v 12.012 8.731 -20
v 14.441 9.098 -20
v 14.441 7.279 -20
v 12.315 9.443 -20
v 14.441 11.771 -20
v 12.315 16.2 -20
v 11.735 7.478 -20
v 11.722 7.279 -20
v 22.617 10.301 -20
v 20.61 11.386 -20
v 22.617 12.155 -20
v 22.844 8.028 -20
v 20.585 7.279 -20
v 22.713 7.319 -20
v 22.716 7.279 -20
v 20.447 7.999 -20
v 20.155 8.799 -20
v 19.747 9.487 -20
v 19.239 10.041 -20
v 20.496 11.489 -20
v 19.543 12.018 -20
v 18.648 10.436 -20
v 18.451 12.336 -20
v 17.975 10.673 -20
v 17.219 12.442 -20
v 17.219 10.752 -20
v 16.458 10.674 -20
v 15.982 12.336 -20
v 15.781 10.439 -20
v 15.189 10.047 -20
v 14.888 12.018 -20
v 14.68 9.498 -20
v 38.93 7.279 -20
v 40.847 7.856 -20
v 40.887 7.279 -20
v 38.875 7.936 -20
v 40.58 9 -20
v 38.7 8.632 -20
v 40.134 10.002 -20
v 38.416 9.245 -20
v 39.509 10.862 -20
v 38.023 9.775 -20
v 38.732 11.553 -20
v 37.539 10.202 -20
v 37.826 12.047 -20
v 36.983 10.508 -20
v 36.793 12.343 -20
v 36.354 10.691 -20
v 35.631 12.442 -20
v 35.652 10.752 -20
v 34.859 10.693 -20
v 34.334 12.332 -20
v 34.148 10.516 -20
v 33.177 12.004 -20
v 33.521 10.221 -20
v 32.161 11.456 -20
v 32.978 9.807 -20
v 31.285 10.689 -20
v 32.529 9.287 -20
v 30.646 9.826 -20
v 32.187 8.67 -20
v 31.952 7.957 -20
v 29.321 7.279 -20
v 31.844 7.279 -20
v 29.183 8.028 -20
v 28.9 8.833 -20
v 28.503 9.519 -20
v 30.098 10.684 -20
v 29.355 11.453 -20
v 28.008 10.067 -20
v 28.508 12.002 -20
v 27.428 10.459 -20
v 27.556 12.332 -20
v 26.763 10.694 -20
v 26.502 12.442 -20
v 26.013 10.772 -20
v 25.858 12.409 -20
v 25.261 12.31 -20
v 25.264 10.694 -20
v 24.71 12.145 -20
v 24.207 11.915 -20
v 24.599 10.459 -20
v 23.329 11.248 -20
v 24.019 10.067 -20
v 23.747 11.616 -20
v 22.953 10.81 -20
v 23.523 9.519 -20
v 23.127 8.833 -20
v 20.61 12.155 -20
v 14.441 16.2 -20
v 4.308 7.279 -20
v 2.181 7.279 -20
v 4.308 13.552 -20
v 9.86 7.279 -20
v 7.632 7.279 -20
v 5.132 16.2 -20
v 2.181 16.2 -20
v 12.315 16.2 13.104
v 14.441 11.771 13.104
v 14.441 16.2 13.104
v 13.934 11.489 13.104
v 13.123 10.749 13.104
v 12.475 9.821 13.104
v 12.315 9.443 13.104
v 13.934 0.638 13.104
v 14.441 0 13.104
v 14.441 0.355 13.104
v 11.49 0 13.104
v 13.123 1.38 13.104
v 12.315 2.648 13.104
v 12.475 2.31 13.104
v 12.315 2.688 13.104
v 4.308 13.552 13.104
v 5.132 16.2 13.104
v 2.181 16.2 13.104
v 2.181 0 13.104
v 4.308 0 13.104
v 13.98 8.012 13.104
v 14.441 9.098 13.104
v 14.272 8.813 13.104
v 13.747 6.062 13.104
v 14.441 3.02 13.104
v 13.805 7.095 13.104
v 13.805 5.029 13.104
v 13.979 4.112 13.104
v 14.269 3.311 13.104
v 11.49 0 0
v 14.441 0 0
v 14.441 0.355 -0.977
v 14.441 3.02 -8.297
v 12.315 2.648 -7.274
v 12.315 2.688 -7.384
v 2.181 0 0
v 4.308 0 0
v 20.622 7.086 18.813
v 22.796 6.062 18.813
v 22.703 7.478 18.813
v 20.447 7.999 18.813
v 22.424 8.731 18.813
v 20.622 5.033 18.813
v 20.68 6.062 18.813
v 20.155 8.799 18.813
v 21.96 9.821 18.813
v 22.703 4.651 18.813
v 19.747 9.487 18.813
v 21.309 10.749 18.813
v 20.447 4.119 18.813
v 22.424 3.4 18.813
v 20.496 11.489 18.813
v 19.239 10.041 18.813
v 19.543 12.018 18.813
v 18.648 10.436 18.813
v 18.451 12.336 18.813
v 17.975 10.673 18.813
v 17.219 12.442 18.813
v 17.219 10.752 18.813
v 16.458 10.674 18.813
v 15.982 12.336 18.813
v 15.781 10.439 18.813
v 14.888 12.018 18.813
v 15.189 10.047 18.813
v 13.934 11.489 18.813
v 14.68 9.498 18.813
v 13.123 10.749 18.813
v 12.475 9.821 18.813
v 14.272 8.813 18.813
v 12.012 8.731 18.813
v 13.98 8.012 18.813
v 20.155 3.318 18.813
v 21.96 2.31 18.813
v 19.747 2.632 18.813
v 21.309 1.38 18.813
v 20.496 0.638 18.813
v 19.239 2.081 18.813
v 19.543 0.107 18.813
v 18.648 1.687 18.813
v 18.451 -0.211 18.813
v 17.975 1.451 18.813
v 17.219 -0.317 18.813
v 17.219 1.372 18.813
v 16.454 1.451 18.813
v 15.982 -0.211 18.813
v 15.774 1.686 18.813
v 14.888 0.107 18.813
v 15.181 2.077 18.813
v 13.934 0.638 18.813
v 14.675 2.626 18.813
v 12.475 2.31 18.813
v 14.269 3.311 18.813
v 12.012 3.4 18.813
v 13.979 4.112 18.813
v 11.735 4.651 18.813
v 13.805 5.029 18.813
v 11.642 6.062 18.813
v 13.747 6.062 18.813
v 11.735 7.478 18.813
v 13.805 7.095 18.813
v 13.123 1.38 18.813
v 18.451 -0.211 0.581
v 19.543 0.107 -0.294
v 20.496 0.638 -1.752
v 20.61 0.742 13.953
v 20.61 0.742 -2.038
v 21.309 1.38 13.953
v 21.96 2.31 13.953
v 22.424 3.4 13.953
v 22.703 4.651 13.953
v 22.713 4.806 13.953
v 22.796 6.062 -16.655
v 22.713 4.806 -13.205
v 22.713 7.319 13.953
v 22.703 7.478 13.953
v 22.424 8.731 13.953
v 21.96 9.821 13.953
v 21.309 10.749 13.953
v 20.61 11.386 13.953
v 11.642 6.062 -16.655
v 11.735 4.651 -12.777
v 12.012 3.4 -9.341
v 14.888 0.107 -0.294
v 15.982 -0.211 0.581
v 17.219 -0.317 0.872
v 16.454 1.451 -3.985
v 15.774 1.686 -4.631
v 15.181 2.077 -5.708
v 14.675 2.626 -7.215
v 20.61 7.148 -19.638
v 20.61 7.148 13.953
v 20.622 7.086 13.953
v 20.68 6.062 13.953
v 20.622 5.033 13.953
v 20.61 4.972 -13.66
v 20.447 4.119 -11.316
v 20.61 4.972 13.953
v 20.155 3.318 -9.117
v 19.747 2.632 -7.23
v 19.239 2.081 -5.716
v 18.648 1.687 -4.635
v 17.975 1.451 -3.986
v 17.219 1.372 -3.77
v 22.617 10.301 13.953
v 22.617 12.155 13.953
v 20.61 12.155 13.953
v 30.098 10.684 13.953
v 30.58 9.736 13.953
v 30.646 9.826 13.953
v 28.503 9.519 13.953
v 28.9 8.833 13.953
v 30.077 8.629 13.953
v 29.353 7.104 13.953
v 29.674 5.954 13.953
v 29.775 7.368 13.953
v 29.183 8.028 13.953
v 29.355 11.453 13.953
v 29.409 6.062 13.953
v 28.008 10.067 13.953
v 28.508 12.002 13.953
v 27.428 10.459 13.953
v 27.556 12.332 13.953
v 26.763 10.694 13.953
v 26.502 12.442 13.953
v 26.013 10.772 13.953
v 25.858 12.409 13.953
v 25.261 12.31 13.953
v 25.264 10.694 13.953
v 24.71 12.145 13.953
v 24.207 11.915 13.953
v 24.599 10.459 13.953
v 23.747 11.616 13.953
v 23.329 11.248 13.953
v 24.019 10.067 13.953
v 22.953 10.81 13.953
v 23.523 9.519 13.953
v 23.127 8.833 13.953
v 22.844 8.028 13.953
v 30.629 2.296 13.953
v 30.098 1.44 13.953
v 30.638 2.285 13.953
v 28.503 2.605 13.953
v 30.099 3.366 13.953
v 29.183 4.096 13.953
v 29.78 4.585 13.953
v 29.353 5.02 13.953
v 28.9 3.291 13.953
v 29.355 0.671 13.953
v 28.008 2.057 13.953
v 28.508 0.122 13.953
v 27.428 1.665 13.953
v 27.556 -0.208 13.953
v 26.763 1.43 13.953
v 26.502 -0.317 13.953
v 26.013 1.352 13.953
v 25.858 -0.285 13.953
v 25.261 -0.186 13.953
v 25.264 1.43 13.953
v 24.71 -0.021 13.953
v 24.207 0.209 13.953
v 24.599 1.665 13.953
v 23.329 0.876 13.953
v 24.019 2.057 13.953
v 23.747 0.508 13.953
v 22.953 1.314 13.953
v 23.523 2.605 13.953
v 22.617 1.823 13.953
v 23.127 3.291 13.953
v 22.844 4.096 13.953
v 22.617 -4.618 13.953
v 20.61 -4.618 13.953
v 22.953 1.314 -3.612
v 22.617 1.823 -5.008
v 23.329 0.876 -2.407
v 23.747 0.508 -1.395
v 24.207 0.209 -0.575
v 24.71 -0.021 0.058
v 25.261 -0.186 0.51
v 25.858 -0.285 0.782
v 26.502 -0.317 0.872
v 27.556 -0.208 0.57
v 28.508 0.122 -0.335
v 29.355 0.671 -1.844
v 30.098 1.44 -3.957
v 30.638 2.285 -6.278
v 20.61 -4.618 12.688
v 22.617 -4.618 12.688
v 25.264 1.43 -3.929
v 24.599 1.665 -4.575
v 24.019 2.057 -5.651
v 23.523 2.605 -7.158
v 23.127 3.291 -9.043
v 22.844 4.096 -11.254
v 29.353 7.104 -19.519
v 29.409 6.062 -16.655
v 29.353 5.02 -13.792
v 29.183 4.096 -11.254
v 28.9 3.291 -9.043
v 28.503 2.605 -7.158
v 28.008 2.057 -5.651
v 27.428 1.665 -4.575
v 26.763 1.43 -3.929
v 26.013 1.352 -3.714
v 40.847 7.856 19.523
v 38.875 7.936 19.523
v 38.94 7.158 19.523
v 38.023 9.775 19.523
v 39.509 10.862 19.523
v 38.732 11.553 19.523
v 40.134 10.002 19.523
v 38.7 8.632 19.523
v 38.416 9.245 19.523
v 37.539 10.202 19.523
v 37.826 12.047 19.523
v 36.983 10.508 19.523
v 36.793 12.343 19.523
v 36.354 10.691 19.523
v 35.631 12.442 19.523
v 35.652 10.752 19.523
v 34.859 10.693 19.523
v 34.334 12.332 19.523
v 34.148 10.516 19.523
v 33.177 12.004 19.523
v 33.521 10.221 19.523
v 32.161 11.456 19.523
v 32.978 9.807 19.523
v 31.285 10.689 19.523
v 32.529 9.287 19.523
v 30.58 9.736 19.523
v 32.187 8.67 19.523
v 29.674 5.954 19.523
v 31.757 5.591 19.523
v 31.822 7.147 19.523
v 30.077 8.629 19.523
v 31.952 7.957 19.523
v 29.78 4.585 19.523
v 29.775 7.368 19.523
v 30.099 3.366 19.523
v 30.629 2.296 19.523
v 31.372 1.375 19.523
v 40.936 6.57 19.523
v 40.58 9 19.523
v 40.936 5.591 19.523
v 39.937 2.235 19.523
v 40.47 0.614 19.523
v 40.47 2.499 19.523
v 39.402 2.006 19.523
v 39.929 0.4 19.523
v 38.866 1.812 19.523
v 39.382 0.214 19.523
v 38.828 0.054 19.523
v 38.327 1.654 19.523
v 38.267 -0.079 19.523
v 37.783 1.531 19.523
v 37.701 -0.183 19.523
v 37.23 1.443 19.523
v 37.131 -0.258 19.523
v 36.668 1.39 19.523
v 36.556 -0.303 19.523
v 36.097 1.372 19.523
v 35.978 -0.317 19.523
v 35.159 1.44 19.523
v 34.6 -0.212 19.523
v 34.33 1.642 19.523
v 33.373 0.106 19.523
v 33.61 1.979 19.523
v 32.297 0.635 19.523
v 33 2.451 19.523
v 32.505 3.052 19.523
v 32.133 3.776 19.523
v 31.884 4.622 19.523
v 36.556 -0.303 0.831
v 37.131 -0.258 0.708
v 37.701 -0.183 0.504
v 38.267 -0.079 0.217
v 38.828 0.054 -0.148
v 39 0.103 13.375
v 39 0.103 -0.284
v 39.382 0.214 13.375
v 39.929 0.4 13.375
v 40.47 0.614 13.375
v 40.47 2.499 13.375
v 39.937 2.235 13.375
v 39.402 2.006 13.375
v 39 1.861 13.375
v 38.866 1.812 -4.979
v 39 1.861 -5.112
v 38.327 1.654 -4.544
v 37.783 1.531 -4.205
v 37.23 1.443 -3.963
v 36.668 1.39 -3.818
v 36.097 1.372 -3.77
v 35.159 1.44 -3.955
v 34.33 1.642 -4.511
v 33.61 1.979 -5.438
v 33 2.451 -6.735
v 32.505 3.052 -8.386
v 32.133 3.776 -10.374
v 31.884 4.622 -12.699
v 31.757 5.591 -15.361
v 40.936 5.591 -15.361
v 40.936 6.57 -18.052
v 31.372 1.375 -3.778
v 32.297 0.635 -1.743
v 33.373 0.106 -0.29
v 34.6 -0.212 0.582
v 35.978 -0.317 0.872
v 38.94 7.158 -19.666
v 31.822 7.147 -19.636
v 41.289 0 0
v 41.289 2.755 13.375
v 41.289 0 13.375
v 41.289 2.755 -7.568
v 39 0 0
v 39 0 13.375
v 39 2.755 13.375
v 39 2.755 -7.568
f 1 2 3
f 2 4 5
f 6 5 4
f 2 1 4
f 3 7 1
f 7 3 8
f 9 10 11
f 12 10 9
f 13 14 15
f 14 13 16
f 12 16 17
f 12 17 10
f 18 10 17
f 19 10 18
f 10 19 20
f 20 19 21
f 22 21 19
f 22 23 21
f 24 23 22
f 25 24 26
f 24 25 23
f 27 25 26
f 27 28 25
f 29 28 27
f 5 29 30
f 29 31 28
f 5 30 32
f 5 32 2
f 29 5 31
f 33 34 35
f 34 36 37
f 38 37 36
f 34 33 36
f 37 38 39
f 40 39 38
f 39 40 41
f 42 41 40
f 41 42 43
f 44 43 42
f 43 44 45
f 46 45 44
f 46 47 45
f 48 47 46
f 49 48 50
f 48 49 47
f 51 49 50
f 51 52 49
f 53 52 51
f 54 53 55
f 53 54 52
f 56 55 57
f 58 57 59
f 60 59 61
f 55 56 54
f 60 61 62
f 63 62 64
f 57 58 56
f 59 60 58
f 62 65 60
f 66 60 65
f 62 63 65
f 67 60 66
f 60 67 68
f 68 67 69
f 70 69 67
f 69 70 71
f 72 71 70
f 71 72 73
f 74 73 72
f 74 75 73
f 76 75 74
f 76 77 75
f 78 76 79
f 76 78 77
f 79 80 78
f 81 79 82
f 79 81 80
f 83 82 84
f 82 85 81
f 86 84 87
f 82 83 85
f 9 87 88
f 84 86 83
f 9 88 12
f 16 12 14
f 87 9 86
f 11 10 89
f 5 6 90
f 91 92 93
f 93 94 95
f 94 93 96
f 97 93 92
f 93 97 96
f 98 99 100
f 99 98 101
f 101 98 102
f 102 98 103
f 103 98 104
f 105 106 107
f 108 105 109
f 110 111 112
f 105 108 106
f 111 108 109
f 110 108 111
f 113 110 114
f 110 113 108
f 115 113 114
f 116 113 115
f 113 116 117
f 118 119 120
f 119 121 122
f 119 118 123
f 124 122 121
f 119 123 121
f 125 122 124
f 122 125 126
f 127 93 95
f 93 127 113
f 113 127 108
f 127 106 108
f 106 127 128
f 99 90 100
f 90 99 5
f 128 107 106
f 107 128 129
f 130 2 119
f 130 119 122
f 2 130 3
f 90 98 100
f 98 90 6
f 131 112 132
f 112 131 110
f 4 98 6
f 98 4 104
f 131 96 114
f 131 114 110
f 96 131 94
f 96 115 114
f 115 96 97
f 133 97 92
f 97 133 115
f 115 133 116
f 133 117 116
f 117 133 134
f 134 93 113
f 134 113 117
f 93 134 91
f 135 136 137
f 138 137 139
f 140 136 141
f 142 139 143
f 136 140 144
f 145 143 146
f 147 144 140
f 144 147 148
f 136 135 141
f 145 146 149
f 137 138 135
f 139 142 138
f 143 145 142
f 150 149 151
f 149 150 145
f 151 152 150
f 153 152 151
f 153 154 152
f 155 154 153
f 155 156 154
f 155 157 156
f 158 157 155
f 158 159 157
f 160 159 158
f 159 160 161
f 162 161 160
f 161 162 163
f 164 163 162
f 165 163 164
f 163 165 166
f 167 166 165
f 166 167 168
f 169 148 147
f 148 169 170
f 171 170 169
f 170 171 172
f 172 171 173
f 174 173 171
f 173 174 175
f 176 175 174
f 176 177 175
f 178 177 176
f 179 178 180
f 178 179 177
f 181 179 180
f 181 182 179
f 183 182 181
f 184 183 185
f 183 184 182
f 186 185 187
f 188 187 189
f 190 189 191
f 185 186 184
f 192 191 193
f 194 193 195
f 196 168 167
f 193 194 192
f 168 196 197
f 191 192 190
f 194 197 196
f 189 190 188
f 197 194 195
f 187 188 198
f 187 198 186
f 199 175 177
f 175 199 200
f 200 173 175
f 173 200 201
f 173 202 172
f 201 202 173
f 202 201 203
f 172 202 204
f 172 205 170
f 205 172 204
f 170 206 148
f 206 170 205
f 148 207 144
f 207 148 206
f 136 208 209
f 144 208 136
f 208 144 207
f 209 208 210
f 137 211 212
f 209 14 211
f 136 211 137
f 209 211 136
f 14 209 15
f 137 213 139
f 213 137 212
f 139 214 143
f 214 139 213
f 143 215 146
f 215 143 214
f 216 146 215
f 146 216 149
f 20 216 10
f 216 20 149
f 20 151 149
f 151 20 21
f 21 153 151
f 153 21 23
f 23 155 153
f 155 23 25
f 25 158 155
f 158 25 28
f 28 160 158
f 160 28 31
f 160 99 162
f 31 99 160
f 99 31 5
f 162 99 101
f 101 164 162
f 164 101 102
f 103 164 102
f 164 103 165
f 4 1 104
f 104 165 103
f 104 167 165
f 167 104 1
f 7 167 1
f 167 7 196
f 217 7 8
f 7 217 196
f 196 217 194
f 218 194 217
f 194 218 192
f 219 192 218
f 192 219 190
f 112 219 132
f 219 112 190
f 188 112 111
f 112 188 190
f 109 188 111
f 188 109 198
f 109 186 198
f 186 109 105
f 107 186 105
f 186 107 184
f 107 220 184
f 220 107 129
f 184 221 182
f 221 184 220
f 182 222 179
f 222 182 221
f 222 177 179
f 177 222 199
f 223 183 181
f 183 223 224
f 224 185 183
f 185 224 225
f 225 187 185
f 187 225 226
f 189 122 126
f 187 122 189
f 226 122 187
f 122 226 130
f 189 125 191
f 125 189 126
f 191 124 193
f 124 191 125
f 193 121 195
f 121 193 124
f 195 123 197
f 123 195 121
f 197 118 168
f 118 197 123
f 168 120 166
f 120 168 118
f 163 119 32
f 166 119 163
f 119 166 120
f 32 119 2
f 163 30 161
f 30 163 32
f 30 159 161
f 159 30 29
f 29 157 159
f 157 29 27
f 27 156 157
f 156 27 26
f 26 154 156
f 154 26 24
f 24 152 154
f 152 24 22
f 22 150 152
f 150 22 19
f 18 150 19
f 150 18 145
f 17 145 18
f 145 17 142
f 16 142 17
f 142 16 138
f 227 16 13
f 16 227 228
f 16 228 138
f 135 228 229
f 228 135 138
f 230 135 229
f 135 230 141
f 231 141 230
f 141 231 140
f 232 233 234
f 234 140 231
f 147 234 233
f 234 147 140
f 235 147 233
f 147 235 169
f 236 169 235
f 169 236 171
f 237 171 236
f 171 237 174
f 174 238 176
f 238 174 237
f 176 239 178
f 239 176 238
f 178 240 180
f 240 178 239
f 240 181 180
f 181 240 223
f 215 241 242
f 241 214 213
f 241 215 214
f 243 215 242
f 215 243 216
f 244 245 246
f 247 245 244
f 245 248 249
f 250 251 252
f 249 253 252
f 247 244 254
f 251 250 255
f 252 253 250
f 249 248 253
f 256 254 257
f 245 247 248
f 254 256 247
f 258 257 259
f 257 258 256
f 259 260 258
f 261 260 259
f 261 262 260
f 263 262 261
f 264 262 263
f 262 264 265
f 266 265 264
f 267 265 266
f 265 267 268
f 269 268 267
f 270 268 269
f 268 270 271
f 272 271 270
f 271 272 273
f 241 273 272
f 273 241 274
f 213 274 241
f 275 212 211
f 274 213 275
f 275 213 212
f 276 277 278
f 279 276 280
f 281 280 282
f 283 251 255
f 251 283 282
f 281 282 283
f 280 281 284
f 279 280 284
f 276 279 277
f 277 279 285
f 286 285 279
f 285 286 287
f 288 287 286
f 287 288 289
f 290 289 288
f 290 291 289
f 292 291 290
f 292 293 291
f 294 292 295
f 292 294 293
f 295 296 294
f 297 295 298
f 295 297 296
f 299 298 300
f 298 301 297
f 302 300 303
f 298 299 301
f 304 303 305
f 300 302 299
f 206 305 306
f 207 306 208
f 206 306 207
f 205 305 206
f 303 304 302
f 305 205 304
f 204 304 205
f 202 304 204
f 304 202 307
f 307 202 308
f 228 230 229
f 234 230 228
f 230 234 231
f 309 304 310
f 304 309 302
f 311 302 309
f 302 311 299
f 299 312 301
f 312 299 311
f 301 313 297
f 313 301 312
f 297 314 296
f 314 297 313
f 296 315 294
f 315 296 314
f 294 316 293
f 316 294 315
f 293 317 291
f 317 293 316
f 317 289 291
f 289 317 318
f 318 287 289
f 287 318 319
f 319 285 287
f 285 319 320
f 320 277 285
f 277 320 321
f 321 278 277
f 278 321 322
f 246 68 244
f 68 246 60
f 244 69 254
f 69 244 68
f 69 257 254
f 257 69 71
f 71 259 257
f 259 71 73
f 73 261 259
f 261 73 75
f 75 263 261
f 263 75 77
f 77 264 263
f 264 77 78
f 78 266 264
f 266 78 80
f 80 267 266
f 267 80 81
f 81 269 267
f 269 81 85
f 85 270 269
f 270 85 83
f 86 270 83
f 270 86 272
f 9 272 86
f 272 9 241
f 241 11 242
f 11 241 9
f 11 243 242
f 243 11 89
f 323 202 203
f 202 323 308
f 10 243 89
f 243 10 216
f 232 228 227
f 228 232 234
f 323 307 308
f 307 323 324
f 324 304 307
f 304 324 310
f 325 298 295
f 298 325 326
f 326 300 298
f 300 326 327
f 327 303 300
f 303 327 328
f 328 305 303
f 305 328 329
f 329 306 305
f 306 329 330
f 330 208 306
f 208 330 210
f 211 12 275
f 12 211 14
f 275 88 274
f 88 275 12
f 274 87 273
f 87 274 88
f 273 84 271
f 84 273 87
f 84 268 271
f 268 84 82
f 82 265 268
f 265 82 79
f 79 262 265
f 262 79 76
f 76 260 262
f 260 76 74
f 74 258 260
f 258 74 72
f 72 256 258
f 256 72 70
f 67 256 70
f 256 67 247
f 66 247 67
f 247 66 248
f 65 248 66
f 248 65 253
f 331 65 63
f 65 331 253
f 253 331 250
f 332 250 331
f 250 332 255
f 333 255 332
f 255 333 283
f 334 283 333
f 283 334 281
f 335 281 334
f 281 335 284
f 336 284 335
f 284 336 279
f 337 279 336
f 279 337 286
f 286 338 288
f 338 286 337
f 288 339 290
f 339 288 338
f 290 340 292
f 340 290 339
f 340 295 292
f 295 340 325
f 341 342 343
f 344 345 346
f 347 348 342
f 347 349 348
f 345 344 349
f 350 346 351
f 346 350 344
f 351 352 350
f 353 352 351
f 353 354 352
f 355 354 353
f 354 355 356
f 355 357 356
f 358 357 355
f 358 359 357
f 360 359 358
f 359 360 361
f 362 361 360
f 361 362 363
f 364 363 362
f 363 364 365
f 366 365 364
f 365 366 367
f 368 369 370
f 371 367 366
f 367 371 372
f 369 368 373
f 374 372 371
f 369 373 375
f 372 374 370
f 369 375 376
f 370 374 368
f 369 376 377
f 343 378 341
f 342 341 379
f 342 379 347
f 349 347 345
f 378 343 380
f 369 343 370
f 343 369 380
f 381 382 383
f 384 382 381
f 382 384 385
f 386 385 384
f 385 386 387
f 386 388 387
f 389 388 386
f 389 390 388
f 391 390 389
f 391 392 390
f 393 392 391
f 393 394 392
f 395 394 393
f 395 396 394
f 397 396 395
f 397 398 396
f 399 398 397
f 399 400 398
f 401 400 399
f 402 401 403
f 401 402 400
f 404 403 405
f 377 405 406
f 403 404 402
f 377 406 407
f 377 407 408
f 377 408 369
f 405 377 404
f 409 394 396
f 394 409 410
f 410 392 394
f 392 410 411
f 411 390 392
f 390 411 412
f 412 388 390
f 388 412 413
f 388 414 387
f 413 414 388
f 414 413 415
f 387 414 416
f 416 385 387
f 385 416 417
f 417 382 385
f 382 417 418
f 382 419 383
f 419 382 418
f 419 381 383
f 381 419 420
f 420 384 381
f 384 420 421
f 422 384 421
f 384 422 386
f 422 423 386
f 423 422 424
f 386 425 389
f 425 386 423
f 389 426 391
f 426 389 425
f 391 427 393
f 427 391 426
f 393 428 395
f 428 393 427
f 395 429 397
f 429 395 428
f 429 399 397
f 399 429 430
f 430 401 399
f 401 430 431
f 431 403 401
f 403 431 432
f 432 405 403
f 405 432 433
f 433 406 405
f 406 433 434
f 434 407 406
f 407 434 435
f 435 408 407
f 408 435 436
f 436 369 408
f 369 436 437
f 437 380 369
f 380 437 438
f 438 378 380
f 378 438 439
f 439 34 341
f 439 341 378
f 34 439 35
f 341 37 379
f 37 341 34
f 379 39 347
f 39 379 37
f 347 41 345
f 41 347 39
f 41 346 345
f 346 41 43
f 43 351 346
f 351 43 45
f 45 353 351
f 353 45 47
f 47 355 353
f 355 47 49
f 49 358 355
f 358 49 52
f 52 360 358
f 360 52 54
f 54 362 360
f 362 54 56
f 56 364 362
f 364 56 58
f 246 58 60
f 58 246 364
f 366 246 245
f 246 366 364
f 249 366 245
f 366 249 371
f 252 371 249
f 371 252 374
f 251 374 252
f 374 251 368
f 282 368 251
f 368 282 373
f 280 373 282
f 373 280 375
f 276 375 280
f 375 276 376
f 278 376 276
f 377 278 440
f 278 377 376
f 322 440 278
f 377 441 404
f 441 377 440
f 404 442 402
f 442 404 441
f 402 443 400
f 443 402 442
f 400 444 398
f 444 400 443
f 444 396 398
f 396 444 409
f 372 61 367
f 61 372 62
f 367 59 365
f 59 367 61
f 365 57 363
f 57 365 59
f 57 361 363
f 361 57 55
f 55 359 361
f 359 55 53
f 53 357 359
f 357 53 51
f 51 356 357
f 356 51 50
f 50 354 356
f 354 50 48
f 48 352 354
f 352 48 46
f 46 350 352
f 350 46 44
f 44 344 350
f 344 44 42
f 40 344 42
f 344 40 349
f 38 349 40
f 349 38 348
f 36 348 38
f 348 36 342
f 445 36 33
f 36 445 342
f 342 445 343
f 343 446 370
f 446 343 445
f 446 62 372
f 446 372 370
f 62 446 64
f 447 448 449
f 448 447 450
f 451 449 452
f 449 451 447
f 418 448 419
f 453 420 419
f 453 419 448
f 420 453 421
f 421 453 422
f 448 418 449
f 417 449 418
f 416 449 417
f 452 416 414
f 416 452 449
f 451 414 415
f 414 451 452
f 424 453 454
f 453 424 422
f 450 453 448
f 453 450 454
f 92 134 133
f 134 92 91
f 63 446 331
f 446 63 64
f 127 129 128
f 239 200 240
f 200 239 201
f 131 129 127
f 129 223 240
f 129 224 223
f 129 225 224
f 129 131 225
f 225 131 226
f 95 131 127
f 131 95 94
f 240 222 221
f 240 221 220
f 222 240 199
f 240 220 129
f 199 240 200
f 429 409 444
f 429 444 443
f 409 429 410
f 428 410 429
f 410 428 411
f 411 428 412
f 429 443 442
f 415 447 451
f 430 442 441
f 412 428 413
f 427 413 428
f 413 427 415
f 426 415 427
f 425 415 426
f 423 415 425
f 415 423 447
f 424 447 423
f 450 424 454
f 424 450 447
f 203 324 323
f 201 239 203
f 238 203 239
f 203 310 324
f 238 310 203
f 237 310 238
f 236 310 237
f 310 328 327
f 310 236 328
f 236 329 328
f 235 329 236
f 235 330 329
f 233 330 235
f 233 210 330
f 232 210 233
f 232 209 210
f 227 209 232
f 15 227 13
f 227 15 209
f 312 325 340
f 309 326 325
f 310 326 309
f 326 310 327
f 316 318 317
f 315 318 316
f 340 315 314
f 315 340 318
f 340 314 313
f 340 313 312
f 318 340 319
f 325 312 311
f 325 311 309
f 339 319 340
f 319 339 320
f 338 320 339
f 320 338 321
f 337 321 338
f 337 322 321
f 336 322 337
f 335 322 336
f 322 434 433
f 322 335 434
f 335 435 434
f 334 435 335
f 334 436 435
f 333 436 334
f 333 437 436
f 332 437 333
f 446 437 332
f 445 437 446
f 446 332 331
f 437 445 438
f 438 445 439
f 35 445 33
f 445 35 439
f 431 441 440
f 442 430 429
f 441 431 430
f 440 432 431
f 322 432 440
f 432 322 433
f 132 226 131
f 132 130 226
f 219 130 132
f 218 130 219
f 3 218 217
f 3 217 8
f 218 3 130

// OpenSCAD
//Set the text to render
textstring="Nope.";

//Font name, e.g. "Libration Sans", "Aldo", depends on what is available on the platform. In the customizer,choose from about 700 Google Fonts. For an overview please refer: http://www.google.com/fonts
fontname="Spicy Rice"; //[ABeeZee,Abel,Abril Fatface,Aclonica,Acme,Actor,Adamina,Advent Pro,Aguafina Script,Akronim,Aladin,Aldrich,Alef,Alegreya,Alegreya Sans,Alegreya Sans SC,Alegreya SC,Alex Brush,Alfa Slab One,Alice,Alike,Alike Angular,Allan,Allerta,Allerta Stencil,Allura,Almendra,Almendra Display,Almendra SC,Amarante,Amaranth,Amatic SC,Amethysta,Amiri,Anaheim,Andada,Andika,Angkor,Annie Use Your Telescope,Anonymous Pro,Antic,Antic Didone,Antic Slab,Anton,Arapey,Arbutus,Arbutus Slab,Architects Daughter,Archivo Black,Archivo Narrow,Arimo,Arizonia,Armata,Artifika,Arvo,Asap,Asset,Astloch,Asul,Atomic Age,Aubrey,Audiowide,Autour One,Average,Average Sans,Averia Gruesa Libre,Averia Libre,Averia Sans Libre,Averia Serif Libre,Bad Script,Balthazar,Bangers,Basic,Battambang,Baumans,Bayon,Belgrano,Belleza,BenchNine,Bentham,Berkshire Swash,Bevan,Bigelow Rules,Bigshot One,Bilbo,Bilbo Swash Caps,Bitter,Black Ops One,Bokor,Bonbon,Boogaloo,Bowlby One,Bowlby One SC,Brawler,Bree Serif,Bubblegum Sans,Bubbler One,Buda,Buenard,Butcherman,Butterfly Kids,Cabin,Cabin Condensed,Cabin Sketch,Caesar Dressing,Cagliostro,Calligraffitti,Cambay,Cambo,Candal,Cantarell,Cantata One,Cantora One,Capriola,Cardo,Carme,Carrois Gothic,Carrois Gothic SC,Carter One,Caudex,Cedarville Cursive,Ceviche One,Changa One,Chango,Chau Philomene One,Chela One,Chelsea Market,Chenla,Cherry Cream Soda,Cherry Swash,Chewy,Chicle,Chivo,Cinzel,Cinzel Decorative,Clicker Script,Coda,Coda Caption,Codystar,Combo,Comfortaa,Coming Soon,Concert One,Condiment,Content,Contrail One,Convergence,Cookie,Copse,Corben,Courgette,Cousine,Coustard,Covered By Your Grace,Crafty Girls,Creepster,Crete Round,Crimson Text,Croissant One,Crushed,Cuprum,Cutive,Cutive Mono,Damion,Dancing Script,Dangrek,Dawning of a New Day,Days One,Dekko,Delius,Delius Swash Caps,Delius Unicase,Della Respira,Denk One,Devonshire,Dhurjati,Didact Gothic,Diplomata,Diplomata SC,Domine,Donegal One,Doppio One,Dorsa,Dosis,Dr Sugiyama,Droid Sans,Droid Sans Mono,Droid Serif,Duru Sans,Dynalight,Eagle Lake,Eater,EB Garamond,Economica,Ek Mukta,Electrolize,Elsie,Elsie Swash Caps,Emblema One,Emilys Candy,Engagement,Englebert,Enriqueta,Erica One,Esteban,Euphoria Script,Ewert,Exo,Exo 2,Expletus Sans,Fanwood Text,Fascinate,Fascinate Inline,Faster One,Fasthand,Fauna One,Federant,Federo,Felipa,Fenix,Finger Paint,Fira Mono,Fira Sans,Fjalla One,Fjord One,Flamenco,Flavors,Fondamento,Fontdiner Swanky,Forum,Francois One,Freckle Face,Fredericka the Great,Fredoka One,Freehand,Fresca,Frijole,Fruktur,Fugaz One,Gabriela,Gafata,Galdeano,Galindo,Gentium Basic,Gentium Book Basic,Geo,Geostar,Geostar Fill,Germania One,GFS Didot,GFS Neohellenic,Gidugu,Gilda Display,Give You Glory,Glass Antiqua,Glegoo,Gloria Hallelujah,Goblin One,Gochi Hand,Gorditas,Goudy Bookletter 1911,Graduate,Grand Hotel,Gravitas One,Great Vibes,Griffy,Gruppo,Gudea,Gurajada,Habibi,Halant,Hammersmith One,Hanalei,Hanalei Fill,Handlee,Hanuman,Happy Monkey,Headland One,Henny Penny,Herr Von Muellerhoff,Hind,Holtwood One SC,Homemade Apple,Homenaje,Iceberg,Iceland,IM Fell Double Pica,IM Fell Double Pica SC,IM Fell DW Pica,IM Fell DW Pica SC,IM Fell English,IM Fell English SC,IM Fell French Canon,IM Fell French Canon SC,IM Fell Great Primer,IM Fell Great Primer SC,Imprima,Inconsolata,Inder,Indie Flower,Inika,Irish Grover,Istok Web,Italiana,Italianno,Jacques Francois,Jacques Francois Shadow,Jim Nightshade,Jockey One,Jolly Lodger,Josefin Sans,Josefin Slab,Joti One,Judson,Julee,Julius Sans One,Junge,Jura,Just Another Hand,Just Me Again Down Here,Kalam,Kameron,Kantumruy,Karla,Karma,Kaushan Script,Kavoon,Kdam Thmor,Keania One,Kelly Slab,Kenia,Khand,Khmer,Khula,Kite One,Knewave,Kotta One,Koulen,Kranky,Kreon,Kristi,Krona One,La Belle Aurore,Laila,Lakki Reddy,Lancelot,Lateef,Lato,League Script,Leckerli One,Ledger,Lekton,Lemon,Liberation Sans,Libre Baskerville,Life Savers,Lilita One,Lily Script One,Limelight,Linden Hill,Lobster,Lobster Two,Londrina Outline,Londrina Shadow,Londrina Sketch,Londrina Solid,Lora,Love Ya Like A Sister,Loved by the King,Lovers Quarrel,Luckiest Guy,Lusitana,Lustria,Macondo,Macondo Swash Caps,Magra,Maiden Orange,Mako,Mallanna,Mandali,Marcellus,Marcellus SC,Marck Script,Margarine,Marko One,Marmelad,Martel Sans,Marvel,Mate,Mate SC,Maven Pro,McLaren,Meddon,MedievalSharp,Medula One,Megrim,Meie Script,Merienda,Merienda One,Merriweather,Merriweather Sans,Metal,Metal Mania,Metamorphous,Metrophobic,Michroma,Milonga,Miltonian,Miltonian Tattoo,Miniver,Miss Fajardose,Modak,Modern Antiqua,Molengo,Molle,Monda,Monofett,Monoton,Monsieur La Doulaise,Montaga,Montez,Montserrat,Montserrat Alternates,Montserrat Subrayada,Moul,Moulpali,Mountains of Christmas,Mouse Memoirs,Mr Bedfort,Mr Dafoe,Mr De Haviland,Mrs Saint Delafield,Mrs Sheppards,Muli,Mystery Quest,Neucha,Neuton,New Rocker,News Cycle,Niconne,Nixie One,Nobile,Nokora,Norican,Nosifer,Nothing You Could Do,Noticia Text,Noto Sans,Noto Serif,Nova Cut,Nova Flat,Nova Mono,Nova Oval,Nova Round,Nova Script,Nova Slim,Nova Square,NTR,Numans,Nunito,Odor Mean Chey,Offside,Old Standard TT,Oldenburg,Oleo Script,Oleo Script Swash Caps,Open Sans,Open Sans Condensed,Oranienbaum,Orbitron,Oregano,Orienta,Original Surfer,Oswald,Over the Rainbow,Overlock,Overlock SC,Ovo,Oxygen,Oxygen Mono,Pacifico,Paprika,Parisienne,Passero One,Passion One,Pathway Gothic One,Patrick Hand,Patrick Hand SC,Patua One,Paytone One,Peddana,Peralta,Permanent Marker,Petit Formal Script,Petrona,Philosopher,Piedra,Pinyon Script,Pirata One,Plaster,Play,Playball,Playfair Display,Playfair Display SC,Podkova,Poiret One,Poller One,Poly,Pompiere,Pontano Sans,Port Lligat Sans,Port Lligat Slab,Prata,Preahvihear,Press Start 2P,Princess Sofia,Prociono,Prosto One,PT Mono,PT Sans,PT Sans Caption,PT Sans Narrow,PT Serif,PT Serif Caption,Puritan,Purple Purse,Quando,Quantico,Quattrocento,Quattrocento Sans,Questrial,Quicksand,Quintessential,Qwigley,Racing Sans One,Radley,Rajdhani,Raleway,Raleway Dots,Ramabhadra,Ramaraja,Rambla,Rammetto One,Ranchers,Rancho,Ranga,Rationale,Ravi Prakash,Redressed,Reenie Beanie,Revalia,Ribeye,Ribeye Marrow,Righteous,Risque,Roboto,Roboto Condensed,Roboto Slab,Rochester,Rock Salt,Rokkitt,Romanesco,Ropa Sans,Rosario,Rosarivo,Rouge Script,Rozha One,Rubik Mono One,Rubik One,Ruda,Rufina,Ruge Boogie,Ruluko,Rum Raisin,Ruslan Display,Russo One,Ruthie,Rye,Sacramento,Sail,Salsa,Sanchez,Sancreek,Sansita One,Sarina,Sarpanch,Satisfy,Scada,Scheherazade,Schoolbell,Seaweed Script,Sevillana,Seymour One,Shadows Into Light,Shadows Into Light Two,Shanti,Share,Share Tech,Share Tech Mono,Shojumaru,Short Stack,Siemreap,Sigmar One,Signika,Signika Negative,Simonetta,Sintony,Sirin Stencil,Six Caps,Skranji,Slabo 13px,Slabo 27px,Slackey,Smokum,Smythe,Sniglet,Snippet,Snowburst One,Sofadi One,Sofia,Sonsie One,Sorts Mill Goudy,Source Code Pro,Source Sans Pro,Source Serif Pro,Special Elite,Spicy Rice,Spinnaker,Spirax,Squada One,Sree Krushnadevaraya,Stalemate,Stalinist One,Stardos Stencil,Stint Ultra Condensed,Stint Ultra Expanded,Stoke,Strait,Sue Ellen Francisco,Sunshiney,Supermercado One,Suranna,Suravaram,Suwannaphum,Swanky and Moo Moo,Syncopate,Tangerine,Taprom,Tauri,Teko,Telex,Tenali Ramakrishna,Tenor Sans,Text Me One,The Girl Next Door,Tienne,Timmana,Tinos,Titan One,Titillium Web,Trade Winds,Trocchi,Trochut,Trykker,Tulpen One,Ubuntu,Ubuntu Condensed,Ubuntu Mono,Ultra,Uncial Antiqua,Underdog,Unica One,UnifrakturCook,UnifrakturMaguntia,Unkempt,Unlock,Unna,Vampiro One,Varela,Varela Round,Vast Shadow,Vesper Libre,Vibur,Vidaloka,Viga,Voces,Volkhov,Vollkorn,Voltaire,VT323,Waiting for the Sunrise,Wallpoet,Walter Turncoat,Warnes,Wellfleet,Wendy One,Wire One,Yanone Kaffeesatz,Yellowtail,Yeseva One,Yesteryear,Zeyada]

//Characters overlap for printing
Overlap=.12;

//Do a random height design or rotate each letter. If you rotate the letters, you can reduce the overall textheight to e.g. 35 and it will become more stable
Letters="Random_height"; //[Random_height,Rotated]

//Rotation angle of letters (if Letters is set to rotated above). You can enter both positive and negative numbers. Ideal are e.g. +10 or -10 degrees
LetterRotation=10;

//Use a rounded base to connect all letters or use a connecting bar? Or  just a bar
Base="None"; //[Bar,Rounded,None]

//Set font size in mm
textsize=16; 

//Maximum thickness (z extrusion height) of the letters in mm (includes random part)
textheight=40;

//Of total thickness: Non-random (=minimum) height of letters, including cutoff (z extrusion height) in mm. Note: Total thickness "textheight" < height of letters "height_letter" < connecting bar height "baseheight"
height_letter=10;

//Of total thickness: Connecting bar height (z extrusion height) in mm. 
baseheight=20;


//Connecting bar thickness in percent of the font size
basethickness_percent=0.2;
basethickness=textsize*basethickness_percent;

//Only for a rounded base: Base increase size to make letters meet, in percent of the textsize
base_radius_add_percent=.22;
base_radius_add=textsize*base_radius_add_percent;

//Shift the font up/down to connect i and j dots? Select "no" if you have no i or j in your text.
do_shift_font="automatic"; //[automatic,yes,no]

//Amount to shift the font up/down to connect i and j dots for printing. 
font_catch_diacritical_sign=2.3; 

//angle to rotate the text upwards
rotate_angle=20;

/* [Hidden] */
//-------------------------------------------------------------------------------

iorj = [ for (i = [0 : len(textstring) - 1]) if (textstring[i]=="i" || textstring[i]=="j") 1 ];


CharacterDistance=.7;//.7 no touch
OverlapLength = Overlap*CharacterDistance;

bigCharacterDistance=CharacterDistance*1.4; // m  M
midbigCharacterDistance=CharacterDistance*1.22; // w W X
CapitalCharacterDistance=CharacterDistance*1.05; // A-Z
midCharacterDistance=CharacterDistance*.85; // c e 
smallCharacterDistance=CharacterDistance*.7; //f t
smallestCharacterDistance=CharacterDistance*.46; // i j l 
    
function add(v, i = 0, r = 0, max) = i < max ? add(v, i + 1, r + v[i], max) : r; 

/*
Fancy Nameplate
Version E, January 2019
Written by MC Geisler (mcgenki at gmail dot com)

This is a proper configurable nameplate, consisting of separate extruded letters. 

Have fun!

License: Attribution 4.0 International (CC BY 4.0)

You are free to:
    Share - copy and redistribute the material in any medium or format
    Adapt - remix, transform, and build upon the material
    for any purpose, even commercially.
*/


module writetextgeneric(textstring, sizeit, type)
{
    shiftit = [ for (i = [0 : len(textstring) - 1]) (textstring[i]=="t" ? -2*smallCharacterDistance:0 )   ]; //2.9?

    skip = [ for (i = [0 : len(textstring) - 1]) 
        (textstring[i]=="f" || textstring[i]=="t" ? smallCharacterDistance : 
        textstring[i]=="i" || textstring[i]=="I" ||textstring[i]=="j" || textstring[i]=="l" ? smallestCharacterDistance:
        textstring[i]=="c" || textstring[i]=="e" || textstring[i]=="k" || textstring[i]=="v" || textstring[i]=="o" || textstring[i]=="s" || textstring[i]=="r"|| textstring[i]=="L" ? midCharacterDistance:
        textstring[i]=="m" || textstring[i]=="M" ? bigCharacterDistance:
        textstring[i]=="w" || textstring[i]=="W" || textstring[i]=="X"? midbigCharacterDistance:
        (textstring[i]>="A" && textstring[i]<="Z" && textstring[i]!="F"&& textstring[i]!="E")? CapitalCharacterDistance:
        CharacterDistance ) 
        - OverlapLength ];

    skiptotal = [ for (ii = [len(textstring)-1 : -1 : 0]) add(skip,max=len(skip)-ii)  ];


        
        translate([0,0,-baseheight])
        for (i = [0 : len(textstring) - 1]) 
        {         
            //echo ("coutn",i-1);
            translate([textsize*(i>0?skiptotal[i-1]:0)+shiftit[i],0,0])
            {
                if(type=="3d" && Letters=="Random_height")
                {
                    linear_extrude(height= rands((baseheight+height_letter)*10,textheight*10,1)[0]/10,convexity = 10)
                    {
                        text( textstring[i] ,size=sizeit,font=fontname,halign="left",valign="baseline");
                        //translate([-textsize*skip[i]/2*0 - shiftit[i]*0,-sizeit/2,0]) square([textsize*skip[i]-.5,sizeit/2], center=false);
                    }
                }
                if(type=="2d")
                {
                    text( textstring[i] ,size=sizeit,font=fontname,halign="left",valign="baseline");
                }
                
                if(type=="3d" && Letters=="Rotated") //Rotated
                {
                    rotate([0,LetterRotation,0])
                        translate([0,0,(LetterRotation<0?sin(LetterRotation)*bigCharacterDistance*textsize:0)])
                            linear_extrude(height= textheight,convexity = 10)
                            {
                                text( textstring[i] ,size=sizeit,font=fontname,halign="left",valign="baseline");
                            }
                
                }
            }


    }
}

module writetextblock(textstring, sizeit)
{
    writetextgeneric(textstring, sizeit, "3d");
}

module writetext(textstring, sizeit)
{
    writetextgeneric(textstring, sizeit, "2d");
}

module Bar(textstr, textsize)
{
    dummy_cutoutlen=len(textstr)*textsize;

    //base line to connect

    linear_extrude(height=baseheight, twist=0, slices=1, $fn=32) 
        hull()
            intersection()
            {
                writetext(textstr, textsize);
                
                //translate([0,-textsize/2+basethickness/2+base_offset,0])
                translate([0,basethickness/2,0])
                   square([dummy_cutoutlen,basethickness],center=false);
            }
}
            
module RiseText(textstr, textsize) 
{

    intersection()
    {
        union()
        {
            writetextblock(textstr, textsize);

            //create base
            if(Base=="Bar")
            {
               translate([0,0,-baseheight])
                    Bar(textstr, textsize);
            }
            
            if (Base=="Rounded")
            {
                 
                    translate([0,0,-baseheight])
                    {
                        linear_extrude(height=baseheight, twist=0, slices=1, $fn=32) 
                            offset(r = base_radius_add) 
                            {
                                writetext(textstr, textsize);
                            }
                        Bar(textstr, textsize);
                    }
            }
            
            
            if ( (do_shift_font=="automatic" && iorj[0]==1) || do_shift_font=="yes" )  
            {
                //connect i and j dots
               
               delta=textsize/30*font_catch_diacritical_sign;
               
               translate([0,0,-baseheight])
               intersection()
               {
                   //connect the dots but maybe too much in other locations
                   linear_extrude(height=1.5,convexity = 10)
                        offset(delta=-delta)   
                            offset(delta=delta)
                                writetext(textstr, textsize);
               
                   //connect only vertical parts by shifting
                   linear_extrude(height=1.5,convexity = 10)
                       for ( i = [-1 : 1] )
                           translate([0,i*delta,0])
                                writetext(textstr, textsize);

               }
           }
       
       
        }
         
        boxwidth=len(textstr)*textsize*CharacterDistance;
        boxlength=textsize*1.3*2;
        boxheight=(textheight)*2.1;
        
        rotate([rotate_angle,0,0])
            translate([-base_radius_add-boxwidth*.2,0,-textheight])
                cube([boxwidth*1.4,boxlength,boxheight],center=false);
        
        translate([-base_radius_add-boxwidth*.2,-textsize*1.3,-baseheight])
                cube([boxwidth*1.4,boxlength*3/2,boxheight],center=false);
        
    }

}

RiseText(textstring,textsize);
